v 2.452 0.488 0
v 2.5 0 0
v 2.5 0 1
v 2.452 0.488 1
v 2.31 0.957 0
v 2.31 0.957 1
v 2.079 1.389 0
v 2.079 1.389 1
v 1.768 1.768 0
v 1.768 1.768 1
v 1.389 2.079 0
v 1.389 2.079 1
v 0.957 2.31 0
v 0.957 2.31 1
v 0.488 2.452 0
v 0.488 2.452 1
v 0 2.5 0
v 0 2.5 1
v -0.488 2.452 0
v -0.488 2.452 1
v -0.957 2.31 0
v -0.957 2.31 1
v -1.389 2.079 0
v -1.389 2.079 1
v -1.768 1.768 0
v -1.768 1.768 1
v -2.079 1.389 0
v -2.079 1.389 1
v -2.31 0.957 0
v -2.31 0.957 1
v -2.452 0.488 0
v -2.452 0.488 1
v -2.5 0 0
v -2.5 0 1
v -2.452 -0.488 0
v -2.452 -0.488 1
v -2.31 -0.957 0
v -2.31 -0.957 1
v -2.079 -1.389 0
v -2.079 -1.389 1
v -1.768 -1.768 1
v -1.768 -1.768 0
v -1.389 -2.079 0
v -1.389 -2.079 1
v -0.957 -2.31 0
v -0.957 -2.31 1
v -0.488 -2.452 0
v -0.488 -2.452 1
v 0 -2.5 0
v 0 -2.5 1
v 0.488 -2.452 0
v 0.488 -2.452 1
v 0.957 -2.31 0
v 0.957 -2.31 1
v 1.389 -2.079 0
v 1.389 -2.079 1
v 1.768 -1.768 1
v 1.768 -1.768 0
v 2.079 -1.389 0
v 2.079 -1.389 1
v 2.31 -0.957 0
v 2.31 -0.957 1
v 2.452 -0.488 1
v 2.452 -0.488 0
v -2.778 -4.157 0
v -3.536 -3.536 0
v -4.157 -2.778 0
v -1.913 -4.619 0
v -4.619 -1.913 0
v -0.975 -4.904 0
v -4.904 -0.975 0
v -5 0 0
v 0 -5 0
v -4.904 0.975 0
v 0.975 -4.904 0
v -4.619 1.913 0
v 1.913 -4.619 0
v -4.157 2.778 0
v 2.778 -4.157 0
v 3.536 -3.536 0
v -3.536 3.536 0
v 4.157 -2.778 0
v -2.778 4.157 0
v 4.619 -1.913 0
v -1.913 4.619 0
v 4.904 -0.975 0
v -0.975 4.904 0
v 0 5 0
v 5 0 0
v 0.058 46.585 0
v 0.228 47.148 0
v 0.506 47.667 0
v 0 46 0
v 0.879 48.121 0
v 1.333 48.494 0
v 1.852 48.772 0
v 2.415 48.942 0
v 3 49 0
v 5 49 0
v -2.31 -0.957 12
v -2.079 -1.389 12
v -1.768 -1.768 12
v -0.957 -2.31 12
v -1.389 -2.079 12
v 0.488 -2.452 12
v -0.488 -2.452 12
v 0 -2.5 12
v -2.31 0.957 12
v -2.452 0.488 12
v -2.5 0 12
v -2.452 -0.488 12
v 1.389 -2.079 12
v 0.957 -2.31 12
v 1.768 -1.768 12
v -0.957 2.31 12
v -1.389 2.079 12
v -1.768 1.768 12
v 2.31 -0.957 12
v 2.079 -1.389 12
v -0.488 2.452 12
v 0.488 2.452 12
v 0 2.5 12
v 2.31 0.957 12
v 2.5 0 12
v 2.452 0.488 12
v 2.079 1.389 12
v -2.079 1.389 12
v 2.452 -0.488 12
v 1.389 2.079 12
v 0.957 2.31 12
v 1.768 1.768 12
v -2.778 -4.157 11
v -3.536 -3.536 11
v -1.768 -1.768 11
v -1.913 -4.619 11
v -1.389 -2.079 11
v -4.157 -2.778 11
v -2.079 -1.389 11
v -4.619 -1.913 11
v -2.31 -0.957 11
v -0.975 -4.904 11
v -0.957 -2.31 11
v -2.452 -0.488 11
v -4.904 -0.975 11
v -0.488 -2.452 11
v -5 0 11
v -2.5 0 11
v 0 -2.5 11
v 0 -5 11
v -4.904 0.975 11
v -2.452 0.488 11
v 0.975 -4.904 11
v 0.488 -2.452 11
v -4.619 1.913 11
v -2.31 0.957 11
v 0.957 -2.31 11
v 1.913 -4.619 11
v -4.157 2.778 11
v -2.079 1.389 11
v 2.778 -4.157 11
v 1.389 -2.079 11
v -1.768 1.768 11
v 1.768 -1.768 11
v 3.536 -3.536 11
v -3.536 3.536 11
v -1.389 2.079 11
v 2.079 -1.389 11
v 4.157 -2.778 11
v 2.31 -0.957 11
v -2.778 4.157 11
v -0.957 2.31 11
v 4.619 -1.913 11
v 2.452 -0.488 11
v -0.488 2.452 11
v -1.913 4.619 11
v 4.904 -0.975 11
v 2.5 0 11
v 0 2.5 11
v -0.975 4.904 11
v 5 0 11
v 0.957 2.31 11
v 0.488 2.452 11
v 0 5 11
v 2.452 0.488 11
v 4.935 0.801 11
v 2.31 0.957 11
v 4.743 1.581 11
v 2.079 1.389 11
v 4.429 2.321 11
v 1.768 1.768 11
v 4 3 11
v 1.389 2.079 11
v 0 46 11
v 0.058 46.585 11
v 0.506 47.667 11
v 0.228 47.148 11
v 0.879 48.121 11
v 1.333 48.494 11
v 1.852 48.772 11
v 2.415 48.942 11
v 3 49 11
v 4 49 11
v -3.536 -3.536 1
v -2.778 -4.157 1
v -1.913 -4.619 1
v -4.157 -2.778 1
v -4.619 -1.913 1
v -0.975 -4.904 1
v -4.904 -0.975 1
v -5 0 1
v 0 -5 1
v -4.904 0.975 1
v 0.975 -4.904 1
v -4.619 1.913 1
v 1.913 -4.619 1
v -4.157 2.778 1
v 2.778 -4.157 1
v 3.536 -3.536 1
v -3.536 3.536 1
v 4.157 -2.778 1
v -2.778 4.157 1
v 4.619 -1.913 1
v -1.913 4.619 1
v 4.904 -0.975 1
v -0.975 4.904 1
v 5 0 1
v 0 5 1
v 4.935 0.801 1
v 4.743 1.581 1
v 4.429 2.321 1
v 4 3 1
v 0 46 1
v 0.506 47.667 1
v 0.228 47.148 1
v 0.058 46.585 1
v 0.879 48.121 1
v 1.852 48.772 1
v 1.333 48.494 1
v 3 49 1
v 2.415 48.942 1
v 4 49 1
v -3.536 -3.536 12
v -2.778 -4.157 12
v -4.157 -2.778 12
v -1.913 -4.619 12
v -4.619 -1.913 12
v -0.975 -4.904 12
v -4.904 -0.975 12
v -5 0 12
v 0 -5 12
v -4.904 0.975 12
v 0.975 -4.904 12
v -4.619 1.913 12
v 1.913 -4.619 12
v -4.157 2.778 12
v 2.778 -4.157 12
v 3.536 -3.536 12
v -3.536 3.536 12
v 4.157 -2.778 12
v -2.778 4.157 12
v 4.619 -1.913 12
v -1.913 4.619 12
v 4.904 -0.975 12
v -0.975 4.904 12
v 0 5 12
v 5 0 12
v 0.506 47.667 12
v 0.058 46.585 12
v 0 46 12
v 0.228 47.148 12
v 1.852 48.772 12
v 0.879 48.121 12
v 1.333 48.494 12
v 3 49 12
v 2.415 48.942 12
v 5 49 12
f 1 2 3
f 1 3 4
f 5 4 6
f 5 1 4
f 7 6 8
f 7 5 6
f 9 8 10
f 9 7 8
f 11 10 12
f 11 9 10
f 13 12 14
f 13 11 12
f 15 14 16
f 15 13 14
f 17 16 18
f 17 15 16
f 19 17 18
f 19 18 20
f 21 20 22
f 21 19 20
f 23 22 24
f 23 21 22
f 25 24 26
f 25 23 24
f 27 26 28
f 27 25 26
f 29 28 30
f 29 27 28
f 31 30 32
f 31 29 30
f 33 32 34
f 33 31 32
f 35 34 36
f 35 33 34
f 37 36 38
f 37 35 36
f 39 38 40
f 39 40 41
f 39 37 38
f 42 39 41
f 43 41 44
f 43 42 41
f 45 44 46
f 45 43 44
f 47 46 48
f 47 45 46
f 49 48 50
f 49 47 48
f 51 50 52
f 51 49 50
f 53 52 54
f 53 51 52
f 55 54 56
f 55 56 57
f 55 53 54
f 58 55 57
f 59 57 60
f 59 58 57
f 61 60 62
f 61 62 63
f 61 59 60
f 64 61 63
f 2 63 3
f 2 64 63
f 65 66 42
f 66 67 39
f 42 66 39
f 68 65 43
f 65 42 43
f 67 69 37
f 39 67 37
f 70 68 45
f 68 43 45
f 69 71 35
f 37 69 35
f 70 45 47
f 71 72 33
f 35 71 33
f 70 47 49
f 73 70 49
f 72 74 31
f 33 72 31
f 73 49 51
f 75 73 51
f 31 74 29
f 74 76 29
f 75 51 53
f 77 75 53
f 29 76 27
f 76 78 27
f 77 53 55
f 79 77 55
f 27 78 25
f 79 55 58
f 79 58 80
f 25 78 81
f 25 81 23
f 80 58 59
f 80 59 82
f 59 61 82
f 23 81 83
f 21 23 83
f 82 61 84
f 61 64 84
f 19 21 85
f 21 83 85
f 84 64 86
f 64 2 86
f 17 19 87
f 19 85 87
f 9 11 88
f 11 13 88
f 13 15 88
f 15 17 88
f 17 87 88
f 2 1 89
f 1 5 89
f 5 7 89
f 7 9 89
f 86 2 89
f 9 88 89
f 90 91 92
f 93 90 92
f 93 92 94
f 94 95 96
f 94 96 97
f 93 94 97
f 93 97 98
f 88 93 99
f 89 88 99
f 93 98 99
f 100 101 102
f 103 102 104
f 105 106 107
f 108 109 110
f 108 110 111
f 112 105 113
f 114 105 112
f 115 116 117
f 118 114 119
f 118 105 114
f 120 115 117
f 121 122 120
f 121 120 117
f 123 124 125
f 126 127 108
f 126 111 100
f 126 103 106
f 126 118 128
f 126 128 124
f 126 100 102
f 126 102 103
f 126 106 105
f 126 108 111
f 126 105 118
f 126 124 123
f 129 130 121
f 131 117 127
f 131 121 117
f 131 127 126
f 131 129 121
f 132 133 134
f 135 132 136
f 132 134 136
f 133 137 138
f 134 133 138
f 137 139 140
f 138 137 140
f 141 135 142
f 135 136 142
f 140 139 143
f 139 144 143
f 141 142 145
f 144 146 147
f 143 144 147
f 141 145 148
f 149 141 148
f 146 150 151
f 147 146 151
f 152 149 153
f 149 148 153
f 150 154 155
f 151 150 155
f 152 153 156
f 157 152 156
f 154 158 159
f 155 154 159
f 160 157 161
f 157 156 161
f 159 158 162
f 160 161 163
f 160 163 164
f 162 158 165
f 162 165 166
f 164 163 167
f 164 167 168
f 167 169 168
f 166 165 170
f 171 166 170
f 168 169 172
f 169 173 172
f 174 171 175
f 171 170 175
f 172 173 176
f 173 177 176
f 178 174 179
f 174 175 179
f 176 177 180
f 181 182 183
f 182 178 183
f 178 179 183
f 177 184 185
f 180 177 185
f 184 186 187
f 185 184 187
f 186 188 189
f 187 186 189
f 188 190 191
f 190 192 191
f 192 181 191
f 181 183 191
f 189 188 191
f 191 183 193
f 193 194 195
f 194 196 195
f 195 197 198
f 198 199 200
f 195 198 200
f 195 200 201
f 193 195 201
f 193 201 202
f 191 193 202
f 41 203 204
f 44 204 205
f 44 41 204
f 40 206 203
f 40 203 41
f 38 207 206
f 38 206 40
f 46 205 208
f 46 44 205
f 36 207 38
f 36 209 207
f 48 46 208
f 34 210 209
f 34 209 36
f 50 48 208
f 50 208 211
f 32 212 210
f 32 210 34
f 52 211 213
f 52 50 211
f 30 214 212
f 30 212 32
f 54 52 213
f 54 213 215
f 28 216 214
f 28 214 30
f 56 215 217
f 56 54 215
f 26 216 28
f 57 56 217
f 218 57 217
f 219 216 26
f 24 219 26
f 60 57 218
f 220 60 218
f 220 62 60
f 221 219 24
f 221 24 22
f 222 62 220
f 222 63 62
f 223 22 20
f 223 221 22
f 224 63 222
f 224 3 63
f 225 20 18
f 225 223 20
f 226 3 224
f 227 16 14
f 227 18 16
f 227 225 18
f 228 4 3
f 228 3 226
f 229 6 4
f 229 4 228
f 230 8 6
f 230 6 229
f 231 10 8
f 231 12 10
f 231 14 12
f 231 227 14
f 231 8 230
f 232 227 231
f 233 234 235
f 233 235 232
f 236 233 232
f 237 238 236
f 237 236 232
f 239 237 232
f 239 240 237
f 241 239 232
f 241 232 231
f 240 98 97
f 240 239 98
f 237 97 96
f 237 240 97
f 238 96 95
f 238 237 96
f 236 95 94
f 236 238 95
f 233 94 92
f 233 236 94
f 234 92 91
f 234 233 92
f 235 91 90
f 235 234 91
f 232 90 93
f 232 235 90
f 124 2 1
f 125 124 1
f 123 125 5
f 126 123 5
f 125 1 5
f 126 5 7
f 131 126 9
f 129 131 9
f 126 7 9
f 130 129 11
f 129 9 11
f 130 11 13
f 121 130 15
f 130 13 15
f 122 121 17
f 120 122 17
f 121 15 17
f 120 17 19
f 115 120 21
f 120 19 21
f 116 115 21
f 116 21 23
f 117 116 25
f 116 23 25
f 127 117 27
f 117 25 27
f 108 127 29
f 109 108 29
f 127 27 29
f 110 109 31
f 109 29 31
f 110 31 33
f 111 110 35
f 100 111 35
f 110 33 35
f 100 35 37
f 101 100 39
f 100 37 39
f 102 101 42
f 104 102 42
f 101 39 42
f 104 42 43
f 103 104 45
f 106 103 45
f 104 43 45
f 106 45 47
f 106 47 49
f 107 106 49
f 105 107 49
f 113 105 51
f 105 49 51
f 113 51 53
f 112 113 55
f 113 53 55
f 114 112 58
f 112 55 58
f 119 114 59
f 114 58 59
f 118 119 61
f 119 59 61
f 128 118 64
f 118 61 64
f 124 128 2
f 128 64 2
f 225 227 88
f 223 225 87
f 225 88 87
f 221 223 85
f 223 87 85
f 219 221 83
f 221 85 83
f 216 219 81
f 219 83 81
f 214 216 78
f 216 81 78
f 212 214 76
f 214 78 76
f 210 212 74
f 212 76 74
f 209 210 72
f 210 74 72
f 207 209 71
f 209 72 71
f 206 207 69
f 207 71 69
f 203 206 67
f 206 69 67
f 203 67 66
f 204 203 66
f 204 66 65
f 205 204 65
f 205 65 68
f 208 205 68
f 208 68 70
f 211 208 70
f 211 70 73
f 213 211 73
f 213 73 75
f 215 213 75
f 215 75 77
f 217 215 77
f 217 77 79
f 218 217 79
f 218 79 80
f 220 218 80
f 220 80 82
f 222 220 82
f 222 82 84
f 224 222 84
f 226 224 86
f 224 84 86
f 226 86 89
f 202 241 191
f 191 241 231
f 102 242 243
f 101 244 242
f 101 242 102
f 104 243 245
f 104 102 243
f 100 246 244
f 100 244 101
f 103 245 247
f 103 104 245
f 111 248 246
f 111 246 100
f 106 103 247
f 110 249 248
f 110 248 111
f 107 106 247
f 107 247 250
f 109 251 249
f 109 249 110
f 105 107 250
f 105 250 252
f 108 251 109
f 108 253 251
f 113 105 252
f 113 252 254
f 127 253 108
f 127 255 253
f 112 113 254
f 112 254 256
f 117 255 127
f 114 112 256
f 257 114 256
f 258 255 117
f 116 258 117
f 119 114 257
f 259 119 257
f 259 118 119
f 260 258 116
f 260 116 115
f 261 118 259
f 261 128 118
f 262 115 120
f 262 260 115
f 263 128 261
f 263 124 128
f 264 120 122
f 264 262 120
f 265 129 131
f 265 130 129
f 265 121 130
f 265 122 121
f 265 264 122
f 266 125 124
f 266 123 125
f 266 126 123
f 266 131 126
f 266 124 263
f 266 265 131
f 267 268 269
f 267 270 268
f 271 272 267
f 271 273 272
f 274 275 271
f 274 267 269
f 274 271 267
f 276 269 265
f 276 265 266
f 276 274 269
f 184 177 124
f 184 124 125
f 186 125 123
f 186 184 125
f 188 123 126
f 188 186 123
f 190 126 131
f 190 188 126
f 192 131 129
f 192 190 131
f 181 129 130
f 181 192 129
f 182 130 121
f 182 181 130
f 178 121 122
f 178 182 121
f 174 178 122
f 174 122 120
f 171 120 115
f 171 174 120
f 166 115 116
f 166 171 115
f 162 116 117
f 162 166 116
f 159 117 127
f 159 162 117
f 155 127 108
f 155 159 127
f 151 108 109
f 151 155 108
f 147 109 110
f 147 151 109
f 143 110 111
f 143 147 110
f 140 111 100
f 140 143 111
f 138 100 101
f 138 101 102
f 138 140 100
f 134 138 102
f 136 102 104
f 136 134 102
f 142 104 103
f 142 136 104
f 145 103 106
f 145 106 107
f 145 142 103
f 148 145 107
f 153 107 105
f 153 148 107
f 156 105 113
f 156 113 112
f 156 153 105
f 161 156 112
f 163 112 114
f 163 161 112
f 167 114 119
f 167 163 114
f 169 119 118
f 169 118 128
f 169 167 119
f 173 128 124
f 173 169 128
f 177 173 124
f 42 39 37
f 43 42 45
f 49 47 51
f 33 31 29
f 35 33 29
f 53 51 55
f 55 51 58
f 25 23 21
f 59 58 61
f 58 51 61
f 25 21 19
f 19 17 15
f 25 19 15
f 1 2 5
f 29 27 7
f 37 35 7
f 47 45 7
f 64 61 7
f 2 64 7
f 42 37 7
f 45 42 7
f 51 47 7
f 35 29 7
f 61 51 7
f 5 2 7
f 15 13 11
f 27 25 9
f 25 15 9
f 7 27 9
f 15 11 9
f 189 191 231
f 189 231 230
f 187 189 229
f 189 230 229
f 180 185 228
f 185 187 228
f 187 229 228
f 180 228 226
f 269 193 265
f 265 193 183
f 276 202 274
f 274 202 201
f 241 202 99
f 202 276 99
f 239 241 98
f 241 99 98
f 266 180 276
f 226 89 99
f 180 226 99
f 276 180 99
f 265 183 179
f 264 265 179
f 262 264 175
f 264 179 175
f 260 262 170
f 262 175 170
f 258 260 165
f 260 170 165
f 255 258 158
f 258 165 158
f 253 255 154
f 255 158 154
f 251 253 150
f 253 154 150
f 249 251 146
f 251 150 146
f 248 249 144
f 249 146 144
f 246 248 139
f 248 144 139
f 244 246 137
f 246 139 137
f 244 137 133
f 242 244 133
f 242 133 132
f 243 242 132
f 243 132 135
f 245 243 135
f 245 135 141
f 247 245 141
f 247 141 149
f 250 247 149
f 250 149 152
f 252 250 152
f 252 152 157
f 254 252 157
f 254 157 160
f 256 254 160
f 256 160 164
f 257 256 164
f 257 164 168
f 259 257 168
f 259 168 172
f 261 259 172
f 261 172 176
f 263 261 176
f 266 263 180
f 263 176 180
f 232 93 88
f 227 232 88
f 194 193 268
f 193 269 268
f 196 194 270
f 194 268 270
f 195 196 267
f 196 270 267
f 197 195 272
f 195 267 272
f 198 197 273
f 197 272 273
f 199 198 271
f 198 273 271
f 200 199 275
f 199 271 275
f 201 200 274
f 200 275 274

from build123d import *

# Parameters (mm, degrees)
BOSS_EXTRUDE1_DEPTH   = 12
SKETCH1_R             = 2.5
BOSS_EXTRUDE1_2_DEPTH = 12
SKETCH1_4_R           = 2.5
BOSS_EXTRUDE2_DEPTH   = 1
BOSS_EXTRUDE3_START   = 11
SKETCH1_5_R           = 2.5
BOSS_EXTRUDE3_DEPTH   = 1
FILLET1_R             = 3


with BuildPart() as part:
    # Sketch1 → Boss-Extrude1 (new body)
    with BuildSketch(Plane.XY):
        with BuildLine():
            ThreePointArc((4, 3), (4.74341649, 1.58113883), (5, 0))
            Line((5, 0), (5, 49))
            Line((5, 49), (4, 49))
            Line((4, 49), (4, 3))
        make_face()
    extrude(amount=BOSS_EXTRUDE1_DEPTH)

    # Sketch1<4> → Boss-Extrude2 (add)
    with BuildSketch(Plane.XY):
        with BuildLine():
            ThreePointArc((0, 5), (-2.236067977, -4.472135955), (4, 3))
            Line((4, 3), (4, 49))
            Line((4, 49), (0, 49))
            Line((0, 49), (0, 5))
        make_face()
        Circle(SKETCH1_4_R, mode=Mode.SUBTRACT)
    extrude(amount=BOSS_EXTRUDE2_DEPTH)

    # Sketch1<5> → Boss-Extrude3 (add)
    with BuildSketch(Plane.XY.offset(BOSS_EXTRUDE3_START)):
        with BuildLine():
            ThreePointArc((0, 5), (-2.236067977, -4.472135955), (4, 3))
            Line((4, 3), (4, 49))
            Line((4, 49), (0, 49))
            Line((0, 49), (0, 5))
        make_face()
        Circle(SKETCH1_5_R, mode=Mode.SUBTRACT)
    extrude(amount=BOSS_EXTRUDE3_DEPTH)

    # Fillet1
    fillet1_edges = [part.edges().sort_by_distance(p)[0] for p in [
        (0, 49, 0.5),
        (0, 49, 11.5),
    ]]
    fillet(fillet1_edges, radius=FILLET1_R)


with BuildPart() as body_2:
    # Sketch1 → Boss-Extrude1 2 (new body)
    with BuildSketch(Plane.XY):
        Circle(SKETCH1_R)
    extrude(amount=BOSS_EXTRUDE1_2_DEPTH)


solid = Compound([part.part, body_2.part])
